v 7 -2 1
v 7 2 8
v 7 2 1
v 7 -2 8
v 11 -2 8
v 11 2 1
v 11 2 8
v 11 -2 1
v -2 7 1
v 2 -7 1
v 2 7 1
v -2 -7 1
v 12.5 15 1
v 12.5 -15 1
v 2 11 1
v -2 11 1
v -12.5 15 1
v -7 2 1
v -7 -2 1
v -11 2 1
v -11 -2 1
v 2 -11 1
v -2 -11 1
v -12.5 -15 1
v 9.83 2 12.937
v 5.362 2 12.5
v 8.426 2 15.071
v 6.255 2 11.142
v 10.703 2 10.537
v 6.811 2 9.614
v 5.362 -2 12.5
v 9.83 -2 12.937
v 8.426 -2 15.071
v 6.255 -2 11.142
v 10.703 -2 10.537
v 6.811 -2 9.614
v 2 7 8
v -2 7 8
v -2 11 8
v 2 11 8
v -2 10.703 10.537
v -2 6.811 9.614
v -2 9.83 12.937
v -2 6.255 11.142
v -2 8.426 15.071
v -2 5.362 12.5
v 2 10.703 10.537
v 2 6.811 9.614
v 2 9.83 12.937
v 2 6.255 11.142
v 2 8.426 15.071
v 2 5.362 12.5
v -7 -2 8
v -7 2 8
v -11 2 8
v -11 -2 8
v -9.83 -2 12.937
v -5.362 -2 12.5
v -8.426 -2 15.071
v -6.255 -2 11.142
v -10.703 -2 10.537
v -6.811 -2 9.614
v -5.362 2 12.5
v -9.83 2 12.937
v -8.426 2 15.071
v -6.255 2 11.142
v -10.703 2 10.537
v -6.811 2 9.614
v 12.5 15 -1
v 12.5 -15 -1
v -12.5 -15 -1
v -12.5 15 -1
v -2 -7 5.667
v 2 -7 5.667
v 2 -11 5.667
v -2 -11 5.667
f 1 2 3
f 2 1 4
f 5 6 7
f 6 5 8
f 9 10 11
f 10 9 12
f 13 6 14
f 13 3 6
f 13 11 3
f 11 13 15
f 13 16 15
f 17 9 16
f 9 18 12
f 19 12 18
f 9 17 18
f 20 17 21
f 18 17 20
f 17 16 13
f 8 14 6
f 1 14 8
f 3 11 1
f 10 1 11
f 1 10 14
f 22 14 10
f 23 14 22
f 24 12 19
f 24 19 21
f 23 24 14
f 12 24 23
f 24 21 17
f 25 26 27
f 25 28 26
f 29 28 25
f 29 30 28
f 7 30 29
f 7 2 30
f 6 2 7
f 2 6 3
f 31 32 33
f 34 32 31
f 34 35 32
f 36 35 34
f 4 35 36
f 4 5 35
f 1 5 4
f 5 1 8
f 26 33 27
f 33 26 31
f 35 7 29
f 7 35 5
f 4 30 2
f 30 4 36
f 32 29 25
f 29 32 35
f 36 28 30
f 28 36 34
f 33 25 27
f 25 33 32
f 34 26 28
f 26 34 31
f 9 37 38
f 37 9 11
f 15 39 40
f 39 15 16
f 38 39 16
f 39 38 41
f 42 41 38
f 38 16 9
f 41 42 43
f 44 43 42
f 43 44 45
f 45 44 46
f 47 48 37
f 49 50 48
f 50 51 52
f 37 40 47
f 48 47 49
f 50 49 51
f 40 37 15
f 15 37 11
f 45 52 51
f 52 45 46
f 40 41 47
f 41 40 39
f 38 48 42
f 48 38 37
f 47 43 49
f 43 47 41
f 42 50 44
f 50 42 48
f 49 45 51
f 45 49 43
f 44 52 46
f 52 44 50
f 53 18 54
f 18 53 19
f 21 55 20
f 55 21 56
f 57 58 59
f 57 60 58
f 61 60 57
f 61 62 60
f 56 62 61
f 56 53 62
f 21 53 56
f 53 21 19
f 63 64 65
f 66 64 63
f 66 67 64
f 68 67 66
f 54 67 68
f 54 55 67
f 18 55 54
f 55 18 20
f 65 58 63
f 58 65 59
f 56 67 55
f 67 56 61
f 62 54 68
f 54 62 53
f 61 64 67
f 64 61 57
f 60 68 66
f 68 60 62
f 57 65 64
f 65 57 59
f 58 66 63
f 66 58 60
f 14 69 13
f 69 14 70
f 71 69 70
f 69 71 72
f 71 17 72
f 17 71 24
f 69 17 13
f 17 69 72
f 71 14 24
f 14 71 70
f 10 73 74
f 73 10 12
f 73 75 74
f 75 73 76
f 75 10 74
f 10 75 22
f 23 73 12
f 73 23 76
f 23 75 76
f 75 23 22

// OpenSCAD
union () {
  cube ([25, 30, 2], center=true);
  rotate (a=0.0, v=[0, 0, 1]) {
    translate ([9, 0, 1]) {
      rotate (a=90.0, v=[1, 0, 0]) {
        union () {
          translate ([0, 7/2, 0]) {
            rotate (a=90.0, v=[1, 0, 0]) {
              cube ([4, 4, 7], center=true);
            }
          }
          translate ([-9, 7, 0]) {
            rotate_extrude (convexity=10, angle=40) {
              translate ([9, 0, ]) {
                square ([4, 4], center=true);
              }
            }
          }
        }
      }
    }
  }
  rotate (a=90.0, v=[0, 0, 1]) {
    translate ([9, 0, 1]) {
      rotate (a=90.0, v=[1, 0, 0]) {
        union () {
          translate ([0, 7/2, 0]) {
            rotate (a=90.0, v=[1, 0, 0]) {
              cube ([4, 4, 7], center=true);
            }
          }
          translate ([-9, 7, 0]) {
            rotate_extrude (convexity=10, angle=40) {
              translate ([9, 0, ]) {
                square ([4, 4], center=true);
              }
            }
          }
        }
      }
    }
  }
  rotate (a=180.0, v=[0, 0, 1]) {
    translate ([9, 0, 1]) {
      rotate (a=90.0, v=[1, 0, 0]) {
        union () {
          translate ([0, 7/2, 0]) {
            rotate (a=90.0, v=[1, 0, 0]) {
              cube ([4, 4, 7], center=true);
            }
          }
          translate ([-9, 7, 0]) {
            rotate_extrude (convexity=10, angle=40) {
              translate ([9, 0, ]) {
                square ([4, 4], center=true);
              }
            }
          }
        }
      }
    }
  }
  rotate (a=270.0, v=[0, 0, 1]) {
    translate ([9, 0, 1]) {
      rotate (a=90.0, v=[1, 0, 0]) {
        union () {
          translate ([0, 2.3333333333333335, 0]) {
            rotate (a=90.0, v=[1, 0, 0]) {
              cube ([4, 4, 4.666666666666667], center=true);
            }
          }
        }
      }
    }
  }
}
